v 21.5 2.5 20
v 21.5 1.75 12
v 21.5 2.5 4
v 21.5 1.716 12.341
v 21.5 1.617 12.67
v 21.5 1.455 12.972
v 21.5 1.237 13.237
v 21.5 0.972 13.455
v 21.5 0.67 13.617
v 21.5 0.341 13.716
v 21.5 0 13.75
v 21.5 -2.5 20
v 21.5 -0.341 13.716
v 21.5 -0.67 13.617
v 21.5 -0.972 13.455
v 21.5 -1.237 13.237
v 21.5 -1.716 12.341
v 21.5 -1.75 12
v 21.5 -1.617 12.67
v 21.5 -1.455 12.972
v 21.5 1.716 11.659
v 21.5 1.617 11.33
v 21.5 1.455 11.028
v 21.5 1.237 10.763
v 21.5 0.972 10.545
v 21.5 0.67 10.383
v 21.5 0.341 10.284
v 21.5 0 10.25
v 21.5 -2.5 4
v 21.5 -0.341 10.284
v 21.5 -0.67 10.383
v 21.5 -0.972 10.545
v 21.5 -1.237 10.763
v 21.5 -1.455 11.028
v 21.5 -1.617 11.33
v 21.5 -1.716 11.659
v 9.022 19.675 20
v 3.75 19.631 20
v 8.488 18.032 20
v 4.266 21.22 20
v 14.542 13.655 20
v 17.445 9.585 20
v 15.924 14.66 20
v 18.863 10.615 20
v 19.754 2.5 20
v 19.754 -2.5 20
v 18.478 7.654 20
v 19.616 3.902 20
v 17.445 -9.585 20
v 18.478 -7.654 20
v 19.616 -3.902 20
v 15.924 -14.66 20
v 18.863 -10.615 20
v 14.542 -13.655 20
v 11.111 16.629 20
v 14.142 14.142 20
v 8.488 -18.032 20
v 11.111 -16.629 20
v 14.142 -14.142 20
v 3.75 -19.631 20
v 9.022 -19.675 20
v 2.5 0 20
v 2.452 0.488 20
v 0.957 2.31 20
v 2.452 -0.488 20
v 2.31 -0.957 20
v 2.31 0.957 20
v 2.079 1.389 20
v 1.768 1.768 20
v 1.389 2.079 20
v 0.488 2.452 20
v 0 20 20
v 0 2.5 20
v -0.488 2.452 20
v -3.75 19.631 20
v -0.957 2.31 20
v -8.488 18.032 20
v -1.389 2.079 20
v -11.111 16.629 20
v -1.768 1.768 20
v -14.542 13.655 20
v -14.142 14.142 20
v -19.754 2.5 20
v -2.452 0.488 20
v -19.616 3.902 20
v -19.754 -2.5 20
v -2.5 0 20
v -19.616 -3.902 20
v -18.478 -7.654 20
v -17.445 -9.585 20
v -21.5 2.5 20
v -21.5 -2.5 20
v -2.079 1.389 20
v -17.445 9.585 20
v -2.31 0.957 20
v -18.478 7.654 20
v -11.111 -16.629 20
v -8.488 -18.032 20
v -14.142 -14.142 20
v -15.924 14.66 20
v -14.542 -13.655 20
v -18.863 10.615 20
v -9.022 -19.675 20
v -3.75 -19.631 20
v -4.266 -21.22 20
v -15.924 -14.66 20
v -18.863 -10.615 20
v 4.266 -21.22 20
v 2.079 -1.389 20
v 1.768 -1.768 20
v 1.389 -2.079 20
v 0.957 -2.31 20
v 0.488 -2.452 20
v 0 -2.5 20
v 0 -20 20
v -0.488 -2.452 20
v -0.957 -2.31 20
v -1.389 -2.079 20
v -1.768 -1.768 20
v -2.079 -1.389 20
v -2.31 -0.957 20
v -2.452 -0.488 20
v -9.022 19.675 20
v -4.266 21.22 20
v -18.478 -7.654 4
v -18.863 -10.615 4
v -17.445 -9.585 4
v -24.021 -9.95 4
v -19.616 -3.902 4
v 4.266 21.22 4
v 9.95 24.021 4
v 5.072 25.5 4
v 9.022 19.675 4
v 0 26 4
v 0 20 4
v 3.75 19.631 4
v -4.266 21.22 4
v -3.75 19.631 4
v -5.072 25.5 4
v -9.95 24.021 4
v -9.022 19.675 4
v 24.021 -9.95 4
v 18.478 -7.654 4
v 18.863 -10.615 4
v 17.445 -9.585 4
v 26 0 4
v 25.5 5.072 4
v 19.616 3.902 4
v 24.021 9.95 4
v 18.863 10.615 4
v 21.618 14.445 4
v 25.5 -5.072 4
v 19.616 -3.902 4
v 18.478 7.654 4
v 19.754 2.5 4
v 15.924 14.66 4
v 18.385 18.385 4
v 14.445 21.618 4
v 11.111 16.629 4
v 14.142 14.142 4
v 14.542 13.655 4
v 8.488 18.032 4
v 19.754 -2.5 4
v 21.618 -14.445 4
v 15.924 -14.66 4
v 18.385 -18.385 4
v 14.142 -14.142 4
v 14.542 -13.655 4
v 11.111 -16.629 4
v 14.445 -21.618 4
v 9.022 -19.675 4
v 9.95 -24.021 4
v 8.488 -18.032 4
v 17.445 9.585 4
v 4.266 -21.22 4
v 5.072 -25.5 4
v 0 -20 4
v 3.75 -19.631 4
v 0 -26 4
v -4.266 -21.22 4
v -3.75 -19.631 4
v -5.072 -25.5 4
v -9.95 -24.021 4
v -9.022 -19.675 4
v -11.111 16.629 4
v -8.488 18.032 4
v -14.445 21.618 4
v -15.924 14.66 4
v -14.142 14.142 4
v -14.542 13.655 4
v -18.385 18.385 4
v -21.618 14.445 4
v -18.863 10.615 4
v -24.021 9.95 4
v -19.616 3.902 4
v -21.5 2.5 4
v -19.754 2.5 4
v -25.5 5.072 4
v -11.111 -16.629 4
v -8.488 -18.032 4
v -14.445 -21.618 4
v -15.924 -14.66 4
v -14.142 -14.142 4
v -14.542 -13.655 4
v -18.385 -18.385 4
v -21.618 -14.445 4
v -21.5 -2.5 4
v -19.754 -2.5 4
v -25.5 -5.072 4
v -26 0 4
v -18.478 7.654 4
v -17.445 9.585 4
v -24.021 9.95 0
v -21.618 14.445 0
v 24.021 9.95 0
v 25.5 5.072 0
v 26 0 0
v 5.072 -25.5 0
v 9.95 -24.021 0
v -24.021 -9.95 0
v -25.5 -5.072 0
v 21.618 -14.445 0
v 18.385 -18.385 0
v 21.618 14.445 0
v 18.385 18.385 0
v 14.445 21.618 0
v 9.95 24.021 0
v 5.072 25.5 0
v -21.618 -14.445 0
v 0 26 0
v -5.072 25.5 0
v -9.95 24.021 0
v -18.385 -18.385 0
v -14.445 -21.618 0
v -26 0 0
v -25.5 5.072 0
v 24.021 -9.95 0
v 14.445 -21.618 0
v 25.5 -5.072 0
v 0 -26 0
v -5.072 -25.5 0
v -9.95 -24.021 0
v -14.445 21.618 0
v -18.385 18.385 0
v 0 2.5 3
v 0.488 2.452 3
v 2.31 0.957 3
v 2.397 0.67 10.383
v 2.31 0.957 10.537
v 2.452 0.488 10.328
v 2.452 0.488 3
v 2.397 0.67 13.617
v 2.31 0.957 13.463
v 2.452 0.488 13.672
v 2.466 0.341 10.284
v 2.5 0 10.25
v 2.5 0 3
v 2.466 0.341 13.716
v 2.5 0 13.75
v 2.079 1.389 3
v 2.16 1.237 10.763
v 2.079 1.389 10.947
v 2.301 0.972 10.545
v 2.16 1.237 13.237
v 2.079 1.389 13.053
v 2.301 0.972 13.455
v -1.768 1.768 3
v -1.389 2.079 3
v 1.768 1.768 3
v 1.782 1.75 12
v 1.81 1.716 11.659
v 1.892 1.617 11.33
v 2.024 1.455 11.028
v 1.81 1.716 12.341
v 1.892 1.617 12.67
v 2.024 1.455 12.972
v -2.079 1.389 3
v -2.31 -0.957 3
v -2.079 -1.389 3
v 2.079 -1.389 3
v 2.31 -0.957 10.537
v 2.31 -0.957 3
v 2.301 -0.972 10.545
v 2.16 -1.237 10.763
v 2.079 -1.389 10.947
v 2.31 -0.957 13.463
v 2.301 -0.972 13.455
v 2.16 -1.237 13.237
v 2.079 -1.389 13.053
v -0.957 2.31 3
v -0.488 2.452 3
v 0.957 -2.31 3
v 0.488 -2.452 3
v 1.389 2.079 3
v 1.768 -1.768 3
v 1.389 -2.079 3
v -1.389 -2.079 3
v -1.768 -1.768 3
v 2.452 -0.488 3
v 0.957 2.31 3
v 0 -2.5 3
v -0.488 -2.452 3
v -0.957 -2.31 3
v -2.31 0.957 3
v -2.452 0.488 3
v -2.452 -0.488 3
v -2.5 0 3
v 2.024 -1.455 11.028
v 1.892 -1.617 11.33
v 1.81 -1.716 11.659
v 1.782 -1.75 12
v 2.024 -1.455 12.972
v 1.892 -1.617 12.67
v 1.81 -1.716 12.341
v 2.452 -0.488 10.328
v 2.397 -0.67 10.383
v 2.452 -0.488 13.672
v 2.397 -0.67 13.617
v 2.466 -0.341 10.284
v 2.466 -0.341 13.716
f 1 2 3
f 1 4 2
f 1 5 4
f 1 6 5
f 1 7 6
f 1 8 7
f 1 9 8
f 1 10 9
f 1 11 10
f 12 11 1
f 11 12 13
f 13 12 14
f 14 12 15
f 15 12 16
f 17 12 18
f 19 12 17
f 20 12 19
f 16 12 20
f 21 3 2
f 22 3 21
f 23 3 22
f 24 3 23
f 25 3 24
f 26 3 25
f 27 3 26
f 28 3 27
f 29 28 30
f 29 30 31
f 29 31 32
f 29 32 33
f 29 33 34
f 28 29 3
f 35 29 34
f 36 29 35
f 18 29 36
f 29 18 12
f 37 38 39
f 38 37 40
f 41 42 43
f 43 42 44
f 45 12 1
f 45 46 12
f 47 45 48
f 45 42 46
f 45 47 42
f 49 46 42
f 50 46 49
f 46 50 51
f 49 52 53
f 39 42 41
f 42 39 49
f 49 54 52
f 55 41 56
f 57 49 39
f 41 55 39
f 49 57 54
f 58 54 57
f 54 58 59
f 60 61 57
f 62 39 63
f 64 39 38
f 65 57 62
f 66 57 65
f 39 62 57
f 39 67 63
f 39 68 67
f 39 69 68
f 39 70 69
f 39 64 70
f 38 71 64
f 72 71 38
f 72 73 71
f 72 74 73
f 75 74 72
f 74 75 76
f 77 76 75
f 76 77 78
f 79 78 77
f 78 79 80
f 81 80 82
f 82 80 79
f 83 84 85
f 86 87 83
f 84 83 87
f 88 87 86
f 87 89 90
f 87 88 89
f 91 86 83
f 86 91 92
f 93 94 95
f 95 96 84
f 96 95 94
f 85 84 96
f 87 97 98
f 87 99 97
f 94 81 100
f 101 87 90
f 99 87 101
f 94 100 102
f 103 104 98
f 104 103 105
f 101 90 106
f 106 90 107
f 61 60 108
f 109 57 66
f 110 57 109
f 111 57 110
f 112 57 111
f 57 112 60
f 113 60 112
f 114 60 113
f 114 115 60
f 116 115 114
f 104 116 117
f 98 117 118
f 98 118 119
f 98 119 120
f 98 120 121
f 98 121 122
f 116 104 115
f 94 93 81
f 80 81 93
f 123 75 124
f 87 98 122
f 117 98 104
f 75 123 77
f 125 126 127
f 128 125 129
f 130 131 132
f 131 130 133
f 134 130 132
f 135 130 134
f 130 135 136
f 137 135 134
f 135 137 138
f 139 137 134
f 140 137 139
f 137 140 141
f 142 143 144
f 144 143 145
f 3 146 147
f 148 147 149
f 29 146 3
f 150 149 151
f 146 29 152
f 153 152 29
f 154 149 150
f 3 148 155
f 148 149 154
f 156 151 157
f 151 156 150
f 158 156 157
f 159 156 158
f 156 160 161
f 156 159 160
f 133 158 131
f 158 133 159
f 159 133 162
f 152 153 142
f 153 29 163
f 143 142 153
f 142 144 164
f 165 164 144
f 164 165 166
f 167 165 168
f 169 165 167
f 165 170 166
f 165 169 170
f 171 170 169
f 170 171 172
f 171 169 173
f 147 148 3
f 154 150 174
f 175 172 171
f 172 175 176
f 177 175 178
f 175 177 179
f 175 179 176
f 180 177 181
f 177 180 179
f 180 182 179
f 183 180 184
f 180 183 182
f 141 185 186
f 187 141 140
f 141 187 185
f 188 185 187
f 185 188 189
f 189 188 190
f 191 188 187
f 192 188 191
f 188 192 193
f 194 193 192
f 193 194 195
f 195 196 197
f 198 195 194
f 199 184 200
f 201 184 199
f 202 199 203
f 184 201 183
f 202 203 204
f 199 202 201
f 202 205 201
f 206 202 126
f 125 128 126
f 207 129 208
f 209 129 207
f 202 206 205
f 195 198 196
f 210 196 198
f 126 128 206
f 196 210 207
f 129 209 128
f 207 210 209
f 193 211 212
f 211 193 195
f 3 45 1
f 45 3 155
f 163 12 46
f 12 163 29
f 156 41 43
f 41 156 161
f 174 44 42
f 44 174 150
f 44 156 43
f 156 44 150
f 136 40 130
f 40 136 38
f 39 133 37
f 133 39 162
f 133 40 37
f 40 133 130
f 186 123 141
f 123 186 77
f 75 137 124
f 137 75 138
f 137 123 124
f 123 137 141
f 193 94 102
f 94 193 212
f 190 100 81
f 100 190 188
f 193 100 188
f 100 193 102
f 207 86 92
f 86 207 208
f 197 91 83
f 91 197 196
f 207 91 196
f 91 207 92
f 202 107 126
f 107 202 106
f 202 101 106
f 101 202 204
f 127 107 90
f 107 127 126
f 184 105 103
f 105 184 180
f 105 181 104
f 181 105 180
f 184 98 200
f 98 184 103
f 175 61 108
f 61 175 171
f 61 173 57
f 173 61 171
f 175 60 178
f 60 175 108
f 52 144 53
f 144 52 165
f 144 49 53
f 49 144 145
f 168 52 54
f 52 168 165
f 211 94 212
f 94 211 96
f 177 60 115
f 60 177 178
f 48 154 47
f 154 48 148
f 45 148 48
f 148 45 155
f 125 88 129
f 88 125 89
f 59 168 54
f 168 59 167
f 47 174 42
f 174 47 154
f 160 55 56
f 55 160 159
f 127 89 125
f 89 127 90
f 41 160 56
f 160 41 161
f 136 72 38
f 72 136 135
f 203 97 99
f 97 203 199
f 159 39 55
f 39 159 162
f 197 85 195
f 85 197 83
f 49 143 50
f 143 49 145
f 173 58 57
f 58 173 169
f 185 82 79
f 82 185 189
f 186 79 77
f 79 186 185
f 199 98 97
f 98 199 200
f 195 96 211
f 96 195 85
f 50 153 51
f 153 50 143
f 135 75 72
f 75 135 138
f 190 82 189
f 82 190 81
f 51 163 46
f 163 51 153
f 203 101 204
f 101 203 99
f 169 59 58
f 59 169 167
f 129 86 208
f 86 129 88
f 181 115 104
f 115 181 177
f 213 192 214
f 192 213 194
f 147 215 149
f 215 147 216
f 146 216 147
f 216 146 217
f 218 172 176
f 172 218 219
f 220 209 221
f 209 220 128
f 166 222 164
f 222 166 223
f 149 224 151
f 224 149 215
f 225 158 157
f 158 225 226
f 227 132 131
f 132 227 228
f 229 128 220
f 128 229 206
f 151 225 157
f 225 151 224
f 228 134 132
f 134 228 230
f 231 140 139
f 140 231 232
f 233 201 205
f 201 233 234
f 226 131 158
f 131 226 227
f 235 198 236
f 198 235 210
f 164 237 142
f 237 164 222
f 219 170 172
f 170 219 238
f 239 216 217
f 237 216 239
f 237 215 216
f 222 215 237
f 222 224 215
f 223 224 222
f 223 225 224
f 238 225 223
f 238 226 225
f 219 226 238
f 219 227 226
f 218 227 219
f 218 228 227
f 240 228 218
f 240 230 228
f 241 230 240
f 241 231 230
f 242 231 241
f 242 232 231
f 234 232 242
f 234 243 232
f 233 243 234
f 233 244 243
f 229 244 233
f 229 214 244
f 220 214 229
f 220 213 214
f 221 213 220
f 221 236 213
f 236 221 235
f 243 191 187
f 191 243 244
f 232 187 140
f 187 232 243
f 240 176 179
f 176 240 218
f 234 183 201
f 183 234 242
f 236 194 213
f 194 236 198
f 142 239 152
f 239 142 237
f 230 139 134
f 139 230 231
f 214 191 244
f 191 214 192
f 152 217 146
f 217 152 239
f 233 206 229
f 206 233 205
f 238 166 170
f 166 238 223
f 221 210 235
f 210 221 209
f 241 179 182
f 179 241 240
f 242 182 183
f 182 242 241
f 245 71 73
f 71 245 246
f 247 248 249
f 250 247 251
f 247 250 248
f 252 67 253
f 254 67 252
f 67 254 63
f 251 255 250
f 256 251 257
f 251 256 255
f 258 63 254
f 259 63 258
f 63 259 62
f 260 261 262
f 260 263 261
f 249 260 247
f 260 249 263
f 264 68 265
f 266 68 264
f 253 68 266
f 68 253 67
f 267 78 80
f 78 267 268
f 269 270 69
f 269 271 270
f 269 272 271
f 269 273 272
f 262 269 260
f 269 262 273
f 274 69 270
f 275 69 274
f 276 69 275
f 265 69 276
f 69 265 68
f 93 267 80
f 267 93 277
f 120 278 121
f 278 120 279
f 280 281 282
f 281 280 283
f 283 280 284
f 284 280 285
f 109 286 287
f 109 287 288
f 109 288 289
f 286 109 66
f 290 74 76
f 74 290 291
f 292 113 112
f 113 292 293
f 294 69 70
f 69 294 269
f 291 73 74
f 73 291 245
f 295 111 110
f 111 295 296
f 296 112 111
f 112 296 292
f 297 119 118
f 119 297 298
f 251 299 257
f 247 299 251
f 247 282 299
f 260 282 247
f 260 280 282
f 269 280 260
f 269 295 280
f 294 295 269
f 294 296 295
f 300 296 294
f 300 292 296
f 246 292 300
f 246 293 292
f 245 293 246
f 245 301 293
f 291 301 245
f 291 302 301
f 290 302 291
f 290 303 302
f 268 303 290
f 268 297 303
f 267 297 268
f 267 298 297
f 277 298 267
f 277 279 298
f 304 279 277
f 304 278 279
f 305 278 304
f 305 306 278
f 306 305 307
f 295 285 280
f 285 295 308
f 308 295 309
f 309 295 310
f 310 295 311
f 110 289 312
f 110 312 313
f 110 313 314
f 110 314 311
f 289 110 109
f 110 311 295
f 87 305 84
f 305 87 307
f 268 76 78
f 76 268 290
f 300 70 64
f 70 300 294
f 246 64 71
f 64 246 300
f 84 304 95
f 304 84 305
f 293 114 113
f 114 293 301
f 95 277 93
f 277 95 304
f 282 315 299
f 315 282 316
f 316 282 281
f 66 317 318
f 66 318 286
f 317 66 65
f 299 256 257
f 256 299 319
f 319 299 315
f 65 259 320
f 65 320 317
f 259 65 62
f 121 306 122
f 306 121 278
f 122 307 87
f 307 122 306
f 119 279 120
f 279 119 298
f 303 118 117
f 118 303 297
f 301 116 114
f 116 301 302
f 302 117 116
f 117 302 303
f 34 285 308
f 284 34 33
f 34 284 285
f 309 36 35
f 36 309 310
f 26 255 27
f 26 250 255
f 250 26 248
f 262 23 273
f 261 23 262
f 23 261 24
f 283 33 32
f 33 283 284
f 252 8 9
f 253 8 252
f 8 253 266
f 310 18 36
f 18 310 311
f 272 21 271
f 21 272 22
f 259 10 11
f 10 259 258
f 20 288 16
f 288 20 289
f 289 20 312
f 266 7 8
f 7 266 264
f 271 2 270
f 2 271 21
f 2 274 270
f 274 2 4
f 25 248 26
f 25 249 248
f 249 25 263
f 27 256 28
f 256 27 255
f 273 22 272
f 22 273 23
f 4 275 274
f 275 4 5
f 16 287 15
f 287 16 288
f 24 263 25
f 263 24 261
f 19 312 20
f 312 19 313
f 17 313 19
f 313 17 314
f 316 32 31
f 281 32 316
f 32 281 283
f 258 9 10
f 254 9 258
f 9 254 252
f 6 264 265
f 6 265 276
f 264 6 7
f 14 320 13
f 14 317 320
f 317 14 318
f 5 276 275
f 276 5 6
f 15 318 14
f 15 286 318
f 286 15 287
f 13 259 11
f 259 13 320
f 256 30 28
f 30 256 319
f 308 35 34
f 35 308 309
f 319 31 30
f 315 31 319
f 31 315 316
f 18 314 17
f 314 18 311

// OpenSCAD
$fn = 32;

// ----------------------------------------------------------------------
// Control knob: skirt knob with grip ribs
// ----------------------------------------------------------------------

// --- parameters (mm) ---
skirt_d = 52;             // skirt diameter
skirt_t = 4;              // skirt thickness
rib_w = 5;                // grip rib width
rib_out = 2.5;            // grip rib radial protrusion
n_ribs = 10;              // number of grip ribs
knob_d = 40;              // knob body diameter
knob_h = 16;              // knob body height
bore_d = 5;               // shaft bore diameter
set_d = 3.5;              // set screw bore diameter

rib_step = 360 / n_ribs;  // rib angular step
total_h = skirt_t + knob_h;  // overall height

difference() {
  union() {
    translate([0, 0, skirt_t]) cylinder(h = knob_h, d = knob_d);
    cylinder(h = skirt_t, d = skirt_d);
    for (i = [0 : n_ribs - 1])
      rotate([0, 0, i * rib_step])
        translate([knob_d / 2 - 1, -rib_w / 2, skirt_t])
          cube([rib_out, rib_w, knob_h]);
  }
  translate([0, 0, skirt_t - 1]) cylinder(h = knob_h + 2, d = bore_d);
  translate([-1, 0, skirt_t + knob_h / 2]) rotate([0, 90, 0])
    cylinder(h = knob_d / 2 + bore_d / 2 + 2, d = set_d);
}
